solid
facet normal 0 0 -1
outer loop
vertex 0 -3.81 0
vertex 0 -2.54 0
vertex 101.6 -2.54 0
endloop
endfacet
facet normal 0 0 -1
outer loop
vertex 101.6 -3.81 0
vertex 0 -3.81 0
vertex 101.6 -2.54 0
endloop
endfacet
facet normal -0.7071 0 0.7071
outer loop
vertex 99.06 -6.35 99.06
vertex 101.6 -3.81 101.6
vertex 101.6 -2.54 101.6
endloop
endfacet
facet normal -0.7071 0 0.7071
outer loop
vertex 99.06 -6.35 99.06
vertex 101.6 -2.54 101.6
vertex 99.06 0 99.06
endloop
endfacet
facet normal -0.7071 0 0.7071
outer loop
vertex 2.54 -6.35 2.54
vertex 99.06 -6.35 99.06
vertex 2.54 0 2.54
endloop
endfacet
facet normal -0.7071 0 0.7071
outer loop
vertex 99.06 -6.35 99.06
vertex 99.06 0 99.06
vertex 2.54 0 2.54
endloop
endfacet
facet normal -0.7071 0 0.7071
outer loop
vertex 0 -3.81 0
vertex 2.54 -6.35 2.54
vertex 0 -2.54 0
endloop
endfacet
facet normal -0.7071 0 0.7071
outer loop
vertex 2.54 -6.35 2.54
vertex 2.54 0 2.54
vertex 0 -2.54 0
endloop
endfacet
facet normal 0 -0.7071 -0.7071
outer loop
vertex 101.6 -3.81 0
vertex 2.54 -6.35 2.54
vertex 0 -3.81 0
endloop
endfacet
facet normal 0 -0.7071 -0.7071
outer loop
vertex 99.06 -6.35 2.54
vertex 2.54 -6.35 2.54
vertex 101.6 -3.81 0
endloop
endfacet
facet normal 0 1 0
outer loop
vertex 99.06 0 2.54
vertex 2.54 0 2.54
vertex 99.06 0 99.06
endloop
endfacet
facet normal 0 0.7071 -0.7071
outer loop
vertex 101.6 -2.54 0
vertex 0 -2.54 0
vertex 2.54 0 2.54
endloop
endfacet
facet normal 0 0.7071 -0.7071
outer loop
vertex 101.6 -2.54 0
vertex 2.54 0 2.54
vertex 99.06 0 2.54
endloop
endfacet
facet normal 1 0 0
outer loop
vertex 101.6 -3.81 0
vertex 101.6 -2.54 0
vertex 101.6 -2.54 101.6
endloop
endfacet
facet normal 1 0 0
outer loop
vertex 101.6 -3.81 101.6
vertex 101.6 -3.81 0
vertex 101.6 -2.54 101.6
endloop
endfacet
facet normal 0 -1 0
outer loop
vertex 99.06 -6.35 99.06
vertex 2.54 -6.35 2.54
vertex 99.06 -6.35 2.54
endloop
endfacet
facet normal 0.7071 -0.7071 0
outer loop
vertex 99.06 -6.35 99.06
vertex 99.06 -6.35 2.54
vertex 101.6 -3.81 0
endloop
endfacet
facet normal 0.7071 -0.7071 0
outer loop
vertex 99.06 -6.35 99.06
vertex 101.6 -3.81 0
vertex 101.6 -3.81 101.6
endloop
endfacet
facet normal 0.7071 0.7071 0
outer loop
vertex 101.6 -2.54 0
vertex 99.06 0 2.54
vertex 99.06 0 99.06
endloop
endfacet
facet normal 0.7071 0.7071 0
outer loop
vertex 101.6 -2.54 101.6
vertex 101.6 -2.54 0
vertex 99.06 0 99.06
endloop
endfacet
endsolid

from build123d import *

# Parameters (mm, degrees)
F1_DEPTH = 6.35
F2_SIZE  = 2.54
F3_SIZE  = 2.54


with BuildPart() as f1:
    # F0 (on Front) → F1 (new body)
    with BuildSketch(Plane.XZ):
        Polygon((101.6, 101.6), (0, 0), (101.6, 0), align=None)
    extrude(amount=F1_DEPTH)

    # F2
    f2_edges = [f1.edges().sort_by_distance(p)[0] for p in [
        (101.6, -6.35, 50.8),
        (50.8, -6.35, 0),
    ]]
    chamfer(f2_edges, length=F2_SIZE)

    # F3
    f3_edges = [f1.edges().sort_by_distance(p)[0] for p in [
        (101.6, 0, 50.8),
        (50.8, 0, 0),
    ]]
    chamfer(f3_edges, length=F3_SIZE)


solid = f1.part
